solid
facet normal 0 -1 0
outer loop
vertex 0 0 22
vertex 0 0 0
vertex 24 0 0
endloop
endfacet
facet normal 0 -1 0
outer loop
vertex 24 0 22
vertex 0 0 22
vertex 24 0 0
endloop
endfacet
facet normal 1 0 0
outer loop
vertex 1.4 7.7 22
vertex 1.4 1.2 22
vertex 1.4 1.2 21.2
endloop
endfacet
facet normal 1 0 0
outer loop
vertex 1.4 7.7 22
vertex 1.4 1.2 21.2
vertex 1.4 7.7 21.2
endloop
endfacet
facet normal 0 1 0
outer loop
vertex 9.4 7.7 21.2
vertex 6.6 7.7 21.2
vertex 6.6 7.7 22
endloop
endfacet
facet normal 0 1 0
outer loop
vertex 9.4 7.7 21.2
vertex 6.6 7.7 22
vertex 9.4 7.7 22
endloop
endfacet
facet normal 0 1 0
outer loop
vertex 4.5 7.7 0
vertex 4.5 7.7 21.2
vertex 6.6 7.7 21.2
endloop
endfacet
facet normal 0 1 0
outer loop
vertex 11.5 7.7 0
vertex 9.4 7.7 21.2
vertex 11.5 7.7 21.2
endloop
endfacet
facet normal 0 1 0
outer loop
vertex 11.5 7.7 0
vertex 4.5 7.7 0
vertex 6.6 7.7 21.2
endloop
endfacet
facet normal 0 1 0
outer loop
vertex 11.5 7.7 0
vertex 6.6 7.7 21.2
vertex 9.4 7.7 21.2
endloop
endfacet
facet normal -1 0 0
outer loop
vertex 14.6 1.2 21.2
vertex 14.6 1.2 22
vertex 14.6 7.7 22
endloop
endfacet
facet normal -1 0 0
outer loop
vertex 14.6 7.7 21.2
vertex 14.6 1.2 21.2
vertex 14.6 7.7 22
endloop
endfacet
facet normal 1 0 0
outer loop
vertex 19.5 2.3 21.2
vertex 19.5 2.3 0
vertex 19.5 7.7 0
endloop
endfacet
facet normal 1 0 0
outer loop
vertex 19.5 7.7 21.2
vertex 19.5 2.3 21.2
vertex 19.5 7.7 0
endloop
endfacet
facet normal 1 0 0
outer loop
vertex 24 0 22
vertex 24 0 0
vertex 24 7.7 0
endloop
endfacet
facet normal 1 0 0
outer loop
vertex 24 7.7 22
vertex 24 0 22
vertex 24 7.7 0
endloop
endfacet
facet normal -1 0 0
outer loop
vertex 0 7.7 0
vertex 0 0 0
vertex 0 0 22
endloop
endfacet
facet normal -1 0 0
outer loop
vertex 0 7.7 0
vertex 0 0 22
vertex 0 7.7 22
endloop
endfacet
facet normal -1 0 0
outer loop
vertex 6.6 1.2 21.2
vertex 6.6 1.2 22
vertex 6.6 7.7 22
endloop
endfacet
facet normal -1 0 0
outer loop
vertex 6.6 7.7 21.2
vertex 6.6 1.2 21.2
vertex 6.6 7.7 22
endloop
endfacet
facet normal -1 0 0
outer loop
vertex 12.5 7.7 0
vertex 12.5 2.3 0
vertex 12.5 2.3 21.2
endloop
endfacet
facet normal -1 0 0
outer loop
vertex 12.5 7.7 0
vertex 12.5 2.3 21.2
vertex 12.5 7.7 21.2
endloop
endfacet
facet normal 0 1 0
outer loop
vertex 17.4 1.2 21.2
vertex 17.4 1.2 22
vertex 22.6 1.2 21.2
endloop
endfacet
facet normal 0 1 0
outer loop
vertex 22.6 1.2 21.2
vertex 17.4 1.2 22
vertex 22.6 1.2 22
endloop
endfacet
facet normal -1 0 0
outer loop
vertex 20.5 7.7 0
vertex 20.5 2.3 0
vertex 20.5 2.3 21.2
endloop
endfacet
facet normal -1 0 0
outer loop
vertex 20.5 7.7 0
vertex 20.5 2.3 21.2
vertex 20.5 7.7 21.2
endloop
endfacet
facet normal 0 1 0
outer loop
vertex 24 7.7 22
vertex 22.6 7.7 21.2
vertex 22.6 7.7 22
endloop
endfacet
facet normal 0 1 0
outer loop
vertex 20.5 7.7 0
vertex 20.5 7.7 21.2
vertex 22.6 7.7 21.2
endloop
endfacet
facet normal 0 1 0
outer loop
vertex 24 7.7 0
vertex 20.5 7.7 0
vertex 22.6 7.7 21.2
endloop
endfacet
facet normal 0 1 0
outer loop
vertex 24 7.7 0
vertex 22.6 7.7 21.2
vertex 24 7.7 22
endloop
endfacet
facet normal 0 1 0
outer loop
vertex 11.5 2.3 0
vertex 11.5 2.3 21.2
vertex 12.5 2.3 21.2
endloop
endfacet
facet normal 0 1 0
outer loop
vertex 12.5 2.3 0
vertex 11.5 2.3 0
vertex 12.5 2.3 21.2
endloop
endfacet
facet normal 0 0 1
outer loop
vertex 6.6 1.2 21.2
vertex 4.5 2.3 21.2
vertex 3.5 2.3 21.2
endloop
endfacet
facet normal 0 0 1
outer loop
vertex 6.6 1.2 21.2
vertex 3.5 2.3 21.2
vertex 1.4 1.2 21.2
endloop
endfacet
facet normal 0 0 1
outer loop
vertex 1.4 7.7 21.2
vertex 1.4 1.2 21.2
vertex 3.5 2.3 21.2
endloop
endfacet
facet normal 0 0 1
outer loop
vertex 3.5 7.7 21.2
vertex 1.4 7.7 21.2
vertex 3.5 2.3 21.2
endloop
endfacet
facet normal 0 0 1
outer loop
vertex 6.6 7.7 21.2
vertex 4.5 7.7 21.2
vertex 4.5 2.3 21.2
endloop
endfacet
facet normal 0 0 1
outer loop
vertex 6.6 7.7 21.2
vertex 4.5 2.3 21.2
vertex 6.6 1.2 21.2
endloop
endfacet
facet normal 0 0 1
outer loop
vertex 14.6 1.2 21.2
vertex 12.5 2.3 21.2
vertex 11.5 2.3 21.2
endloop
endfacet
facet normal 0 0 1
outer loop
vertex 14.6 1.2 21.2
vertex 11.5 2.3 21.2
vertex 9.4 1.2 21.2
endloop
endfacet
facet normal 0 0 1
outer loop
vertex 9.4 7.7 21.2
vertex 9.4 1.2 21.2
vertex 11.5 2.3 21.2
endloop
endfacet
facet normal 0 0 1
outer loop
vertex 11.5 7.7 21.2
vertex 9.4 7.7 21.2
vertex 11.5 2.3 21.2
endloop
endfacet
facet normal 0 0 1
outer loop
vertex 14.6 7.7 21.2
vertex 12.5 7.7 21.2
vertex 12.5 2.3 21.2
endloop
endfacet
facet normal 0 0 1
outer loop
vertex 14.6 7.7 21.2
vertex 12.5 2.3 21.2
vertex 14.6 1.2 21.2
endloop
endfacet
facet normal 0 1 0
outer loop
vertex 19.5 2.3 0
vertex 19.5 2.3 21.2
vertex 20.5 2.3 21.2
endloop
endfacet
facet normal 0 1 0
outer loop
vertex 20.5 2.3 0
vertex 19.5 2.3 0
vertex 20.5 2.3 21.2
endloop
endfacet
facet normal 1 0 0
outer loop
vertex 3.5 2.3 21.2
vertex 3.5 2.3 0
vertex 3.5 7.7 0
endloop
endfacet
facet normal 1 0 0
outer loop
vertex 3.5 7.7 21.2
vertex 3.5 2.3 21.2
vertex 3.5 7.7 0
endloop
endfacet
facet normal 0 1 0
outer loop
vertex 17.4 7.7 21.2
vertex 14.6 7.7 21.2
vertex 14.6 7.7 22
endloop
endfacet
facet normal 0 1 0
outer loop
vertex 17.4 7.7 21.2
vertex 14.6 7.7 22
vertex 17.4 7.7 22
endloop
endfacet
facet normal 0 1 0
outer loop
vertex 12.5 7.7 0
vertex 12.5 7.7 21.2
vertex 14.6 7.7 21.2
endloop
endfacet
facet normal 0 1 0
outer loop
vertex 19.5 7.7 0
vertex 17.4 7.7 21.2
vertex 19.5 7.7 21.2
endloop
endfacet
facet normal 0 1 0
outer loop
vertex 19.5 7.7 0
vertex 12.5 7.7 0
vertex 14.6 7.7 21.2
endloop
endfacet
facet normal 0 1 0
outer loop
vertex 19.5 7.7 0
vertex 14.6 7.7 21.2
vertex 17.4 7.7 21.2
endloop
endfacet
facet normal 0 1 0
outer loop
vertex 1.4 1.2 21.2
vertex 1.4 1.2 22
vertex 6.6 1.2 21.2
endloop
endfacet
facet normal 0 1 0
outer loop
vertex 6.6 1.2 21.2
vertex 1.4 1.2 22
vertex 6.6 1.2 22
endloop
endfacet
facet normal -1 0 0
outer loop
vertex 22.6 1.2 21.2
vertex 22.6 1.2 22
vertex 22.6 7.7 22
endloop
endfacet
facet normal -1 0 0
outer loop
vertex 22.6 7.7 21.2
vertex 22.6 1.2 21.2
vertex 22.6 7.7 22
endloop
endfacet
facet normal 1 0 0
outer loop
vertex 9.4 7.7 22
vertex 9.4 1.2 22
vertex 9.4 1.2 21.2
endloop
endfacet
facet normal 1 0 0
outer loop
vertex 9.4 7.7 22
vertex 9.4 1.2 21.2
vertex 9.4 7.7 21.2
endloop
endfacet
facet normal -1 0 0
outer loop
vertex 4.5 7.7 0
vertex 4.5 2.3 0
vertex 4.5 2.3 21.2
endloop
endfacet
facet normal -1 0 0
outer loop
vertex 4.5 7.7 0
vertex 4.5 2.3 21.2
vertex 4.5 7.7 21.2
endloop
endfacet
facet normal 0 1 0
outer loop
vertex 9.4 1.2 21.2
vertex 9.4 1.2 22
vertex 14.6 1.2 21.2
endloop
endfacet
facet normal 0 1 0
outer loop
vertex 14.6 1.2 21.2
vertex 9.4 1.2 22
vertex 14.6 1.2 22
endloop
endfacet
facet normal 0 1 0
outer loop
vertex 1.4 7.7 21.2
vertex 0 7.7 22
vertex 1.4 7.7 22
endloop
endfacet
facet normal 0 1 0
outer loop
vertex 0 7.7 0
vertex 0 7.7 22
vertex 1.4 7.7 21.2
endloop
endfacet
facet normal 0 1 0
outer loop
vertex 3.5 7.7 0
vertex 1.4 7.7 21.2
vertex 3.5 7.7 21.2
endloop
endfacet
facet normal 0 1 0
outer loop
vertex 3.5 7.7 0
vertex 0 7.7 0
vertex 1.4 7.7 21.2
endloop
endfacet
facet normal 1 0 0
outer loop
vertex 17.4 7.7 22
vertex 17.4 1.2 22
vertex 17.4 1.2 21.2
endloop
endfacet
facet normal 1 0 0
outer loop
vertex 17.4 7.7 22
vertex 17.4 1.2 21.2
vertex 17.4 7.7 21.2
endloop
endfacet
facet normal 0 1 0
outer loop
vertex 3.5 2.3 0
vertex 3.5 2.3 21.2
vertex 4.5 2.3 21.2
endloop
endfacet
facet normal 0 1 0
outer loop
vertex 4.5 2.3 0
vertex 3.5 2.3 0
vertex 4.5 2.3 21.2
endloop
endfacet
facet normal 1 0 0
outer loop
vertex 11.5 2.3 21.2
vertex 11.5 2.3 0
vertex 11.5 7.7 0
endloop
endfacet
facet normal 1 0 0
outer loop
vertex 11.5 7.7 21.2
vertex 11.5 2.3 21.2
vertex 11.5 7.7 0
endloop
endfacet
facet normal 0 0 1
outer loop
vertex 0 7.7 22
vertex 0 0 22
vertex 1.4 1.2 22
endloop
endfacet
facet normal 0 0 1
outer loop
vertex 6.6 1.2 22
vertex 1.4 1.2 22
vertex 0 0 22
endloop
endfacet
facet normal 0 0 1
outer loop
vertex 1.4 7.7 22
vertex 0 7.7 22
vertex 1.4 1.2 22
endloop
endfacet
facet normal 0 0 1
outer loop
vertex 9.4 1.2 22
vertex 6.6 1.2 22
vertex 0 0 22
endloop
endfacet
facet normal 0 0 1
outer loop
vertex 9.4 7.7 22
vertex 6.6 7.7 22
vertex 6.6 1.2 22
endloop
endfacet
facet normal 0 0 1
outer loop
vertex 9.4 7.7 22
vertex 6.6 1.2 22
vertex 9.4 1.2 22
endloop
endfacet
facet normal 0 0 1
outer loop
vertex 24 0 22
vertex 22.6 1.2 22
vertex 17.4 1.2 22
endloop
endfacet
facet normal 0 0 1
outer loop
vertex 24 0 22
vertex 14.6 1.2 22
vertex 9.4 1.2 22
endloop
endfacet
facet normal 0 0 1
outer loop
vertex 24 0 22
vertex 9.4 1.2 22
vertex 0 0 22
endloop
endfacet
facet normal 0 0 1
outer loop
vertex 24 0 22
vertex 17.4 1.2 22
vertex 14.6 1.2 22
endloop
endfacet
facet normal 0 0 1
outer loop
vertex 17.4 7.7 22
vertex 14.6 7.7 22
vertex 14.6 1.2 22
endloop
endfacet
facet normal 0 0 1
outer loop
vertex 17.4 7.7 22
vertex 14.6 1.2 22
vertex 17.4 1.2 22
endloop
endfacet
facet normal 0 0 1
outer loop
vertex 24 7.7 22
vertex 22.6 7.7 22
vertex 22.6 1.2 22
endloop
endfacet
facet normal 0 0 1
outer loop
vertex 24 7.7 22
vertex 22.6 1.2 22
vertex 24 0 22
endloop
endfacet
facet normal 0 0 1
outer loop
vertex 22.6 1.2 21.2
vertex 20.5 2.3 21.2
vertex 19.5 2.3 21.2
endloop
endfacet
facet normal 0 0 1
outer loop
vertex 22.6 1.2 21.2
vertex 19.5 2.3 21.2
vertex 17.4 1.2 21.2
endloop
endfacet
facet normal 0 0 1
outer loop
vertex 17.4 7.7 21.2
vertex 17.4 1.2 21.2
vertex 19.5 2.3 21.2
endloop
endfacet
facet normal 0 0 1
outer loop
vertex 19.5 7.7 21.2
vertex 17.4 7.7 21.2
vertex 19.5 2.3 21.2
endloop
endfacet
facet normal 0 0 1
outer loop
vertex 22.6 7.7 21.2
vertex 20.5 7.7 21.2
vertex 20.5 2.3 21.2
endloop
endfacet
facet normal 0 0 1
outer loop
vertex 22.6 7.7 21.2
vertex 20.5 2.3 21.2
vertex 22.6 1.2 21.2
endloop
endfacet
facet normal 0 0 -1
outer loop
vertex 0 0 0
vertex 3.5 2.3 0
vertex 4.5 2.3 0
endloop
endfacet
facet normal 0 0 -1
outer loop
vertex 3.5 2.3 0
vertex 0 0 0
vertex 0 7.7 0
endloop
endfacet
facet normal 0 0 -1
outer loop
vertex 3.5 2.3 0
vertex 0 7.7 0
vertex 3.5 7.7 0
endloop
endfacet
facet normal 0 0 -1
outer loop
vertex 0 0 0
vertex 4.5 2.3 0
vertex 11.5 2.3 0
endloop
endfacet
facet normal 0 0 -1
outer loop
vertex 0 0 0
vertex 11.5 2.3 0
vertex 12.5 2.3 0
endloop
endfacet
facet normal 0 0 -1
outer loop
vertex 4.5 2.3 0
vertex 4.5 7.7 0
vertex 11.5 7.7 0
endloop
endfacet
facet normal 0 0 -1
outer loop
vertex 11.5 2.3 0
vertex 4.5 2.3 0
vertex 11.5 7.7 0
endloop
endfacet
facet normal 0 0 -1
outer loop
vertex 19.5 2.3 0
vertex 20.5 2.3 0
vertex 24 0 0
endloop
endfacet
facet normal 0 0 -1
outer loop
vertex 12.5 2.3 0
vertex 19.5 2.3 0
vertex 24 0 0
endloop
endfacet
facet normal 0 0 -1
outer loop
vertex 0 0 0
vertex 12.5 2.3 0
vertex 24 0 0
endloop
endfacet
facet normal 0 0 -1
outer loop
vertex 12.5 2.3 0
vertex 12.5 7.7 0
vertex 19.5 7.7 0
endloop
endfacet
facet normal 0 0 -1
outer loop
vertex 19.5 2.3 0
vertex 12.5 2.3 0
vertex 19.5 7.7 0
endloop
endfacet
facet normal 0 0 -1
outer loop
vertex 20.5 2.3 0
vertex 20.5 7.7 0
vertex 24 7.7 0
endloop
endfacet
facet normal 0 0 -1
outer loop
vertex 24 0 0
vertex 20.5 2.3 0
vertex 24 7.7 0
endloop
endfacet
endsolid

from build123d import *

# Parameters (mm, degrees)
SKETCH_W               = 24
SKETCH_H               = 7.7
PAD_DEPTH              = 22
SKETCH001_W            = 5.2
SKETCH001_H            = 6.5
POCKET_DEPTH           = 0.8
LINEARPATTERN_COUNT    = 3
LINEARPATTERN_PITCH    = 8
SKETCH002_W            = 1
SKETCH002_H            = 5.4
POCKET001_DEPTH        = 22
LINEARPATTERN001_COUNT = 3
LINEARPATTERN001_PITCH = 8


with BuildPart() as part:
    # Sketch → Pad (new body)
    with BuildSketch(Plane.XY):
        with Locations((12, 3.85)):
            Rectangle(SKETCH_W, SKETCH_H)
    extrude(amount=PAD_DEPTH)

    # Sketch001 (on Face6 of Pad) → Pocket (cut)
    with BuildSketch(Plane.XY.offset(22)):
        with Locations((4, 4.45)):
            Rectangle(SKETCH001_W, SKETCH001_H)
    pocket = extrude(amount=-POCKET_DEPTH, mode=Mode.SUBTRACT)

    # LinearPattern: Pocket ×3
    with Locations(*[(i * LINEARPATTERN_PITCH, 0, 0) for i in range(1, LINEARPATTERN_COUNT)]):
        add(pocket, mode=Mode.SUBTRACT)

    # Sketch002 (on Face16 of LinearPattern) → Pocket001 (cut)
    with BuildSketch(Plane.XY.offset(21.2)):
        with Locations((4, 5)):
            Rectangle(SKETCH002_W, SKETCH002_H)
    pocket001 = extrude(amount=-POCKET001_DEPTH, mode=Mode.SUBTRACT)

    # LinearPattern001: Pocket001 ×3
    with Locations(*[(i * LINEARPATTERN001_PITCH, 0, 0) for i in range(1, LINEARPATTERN001_COUNT)]):
        add(pocket001, mode=Mode.SUBTRACT)


solid = part.part
